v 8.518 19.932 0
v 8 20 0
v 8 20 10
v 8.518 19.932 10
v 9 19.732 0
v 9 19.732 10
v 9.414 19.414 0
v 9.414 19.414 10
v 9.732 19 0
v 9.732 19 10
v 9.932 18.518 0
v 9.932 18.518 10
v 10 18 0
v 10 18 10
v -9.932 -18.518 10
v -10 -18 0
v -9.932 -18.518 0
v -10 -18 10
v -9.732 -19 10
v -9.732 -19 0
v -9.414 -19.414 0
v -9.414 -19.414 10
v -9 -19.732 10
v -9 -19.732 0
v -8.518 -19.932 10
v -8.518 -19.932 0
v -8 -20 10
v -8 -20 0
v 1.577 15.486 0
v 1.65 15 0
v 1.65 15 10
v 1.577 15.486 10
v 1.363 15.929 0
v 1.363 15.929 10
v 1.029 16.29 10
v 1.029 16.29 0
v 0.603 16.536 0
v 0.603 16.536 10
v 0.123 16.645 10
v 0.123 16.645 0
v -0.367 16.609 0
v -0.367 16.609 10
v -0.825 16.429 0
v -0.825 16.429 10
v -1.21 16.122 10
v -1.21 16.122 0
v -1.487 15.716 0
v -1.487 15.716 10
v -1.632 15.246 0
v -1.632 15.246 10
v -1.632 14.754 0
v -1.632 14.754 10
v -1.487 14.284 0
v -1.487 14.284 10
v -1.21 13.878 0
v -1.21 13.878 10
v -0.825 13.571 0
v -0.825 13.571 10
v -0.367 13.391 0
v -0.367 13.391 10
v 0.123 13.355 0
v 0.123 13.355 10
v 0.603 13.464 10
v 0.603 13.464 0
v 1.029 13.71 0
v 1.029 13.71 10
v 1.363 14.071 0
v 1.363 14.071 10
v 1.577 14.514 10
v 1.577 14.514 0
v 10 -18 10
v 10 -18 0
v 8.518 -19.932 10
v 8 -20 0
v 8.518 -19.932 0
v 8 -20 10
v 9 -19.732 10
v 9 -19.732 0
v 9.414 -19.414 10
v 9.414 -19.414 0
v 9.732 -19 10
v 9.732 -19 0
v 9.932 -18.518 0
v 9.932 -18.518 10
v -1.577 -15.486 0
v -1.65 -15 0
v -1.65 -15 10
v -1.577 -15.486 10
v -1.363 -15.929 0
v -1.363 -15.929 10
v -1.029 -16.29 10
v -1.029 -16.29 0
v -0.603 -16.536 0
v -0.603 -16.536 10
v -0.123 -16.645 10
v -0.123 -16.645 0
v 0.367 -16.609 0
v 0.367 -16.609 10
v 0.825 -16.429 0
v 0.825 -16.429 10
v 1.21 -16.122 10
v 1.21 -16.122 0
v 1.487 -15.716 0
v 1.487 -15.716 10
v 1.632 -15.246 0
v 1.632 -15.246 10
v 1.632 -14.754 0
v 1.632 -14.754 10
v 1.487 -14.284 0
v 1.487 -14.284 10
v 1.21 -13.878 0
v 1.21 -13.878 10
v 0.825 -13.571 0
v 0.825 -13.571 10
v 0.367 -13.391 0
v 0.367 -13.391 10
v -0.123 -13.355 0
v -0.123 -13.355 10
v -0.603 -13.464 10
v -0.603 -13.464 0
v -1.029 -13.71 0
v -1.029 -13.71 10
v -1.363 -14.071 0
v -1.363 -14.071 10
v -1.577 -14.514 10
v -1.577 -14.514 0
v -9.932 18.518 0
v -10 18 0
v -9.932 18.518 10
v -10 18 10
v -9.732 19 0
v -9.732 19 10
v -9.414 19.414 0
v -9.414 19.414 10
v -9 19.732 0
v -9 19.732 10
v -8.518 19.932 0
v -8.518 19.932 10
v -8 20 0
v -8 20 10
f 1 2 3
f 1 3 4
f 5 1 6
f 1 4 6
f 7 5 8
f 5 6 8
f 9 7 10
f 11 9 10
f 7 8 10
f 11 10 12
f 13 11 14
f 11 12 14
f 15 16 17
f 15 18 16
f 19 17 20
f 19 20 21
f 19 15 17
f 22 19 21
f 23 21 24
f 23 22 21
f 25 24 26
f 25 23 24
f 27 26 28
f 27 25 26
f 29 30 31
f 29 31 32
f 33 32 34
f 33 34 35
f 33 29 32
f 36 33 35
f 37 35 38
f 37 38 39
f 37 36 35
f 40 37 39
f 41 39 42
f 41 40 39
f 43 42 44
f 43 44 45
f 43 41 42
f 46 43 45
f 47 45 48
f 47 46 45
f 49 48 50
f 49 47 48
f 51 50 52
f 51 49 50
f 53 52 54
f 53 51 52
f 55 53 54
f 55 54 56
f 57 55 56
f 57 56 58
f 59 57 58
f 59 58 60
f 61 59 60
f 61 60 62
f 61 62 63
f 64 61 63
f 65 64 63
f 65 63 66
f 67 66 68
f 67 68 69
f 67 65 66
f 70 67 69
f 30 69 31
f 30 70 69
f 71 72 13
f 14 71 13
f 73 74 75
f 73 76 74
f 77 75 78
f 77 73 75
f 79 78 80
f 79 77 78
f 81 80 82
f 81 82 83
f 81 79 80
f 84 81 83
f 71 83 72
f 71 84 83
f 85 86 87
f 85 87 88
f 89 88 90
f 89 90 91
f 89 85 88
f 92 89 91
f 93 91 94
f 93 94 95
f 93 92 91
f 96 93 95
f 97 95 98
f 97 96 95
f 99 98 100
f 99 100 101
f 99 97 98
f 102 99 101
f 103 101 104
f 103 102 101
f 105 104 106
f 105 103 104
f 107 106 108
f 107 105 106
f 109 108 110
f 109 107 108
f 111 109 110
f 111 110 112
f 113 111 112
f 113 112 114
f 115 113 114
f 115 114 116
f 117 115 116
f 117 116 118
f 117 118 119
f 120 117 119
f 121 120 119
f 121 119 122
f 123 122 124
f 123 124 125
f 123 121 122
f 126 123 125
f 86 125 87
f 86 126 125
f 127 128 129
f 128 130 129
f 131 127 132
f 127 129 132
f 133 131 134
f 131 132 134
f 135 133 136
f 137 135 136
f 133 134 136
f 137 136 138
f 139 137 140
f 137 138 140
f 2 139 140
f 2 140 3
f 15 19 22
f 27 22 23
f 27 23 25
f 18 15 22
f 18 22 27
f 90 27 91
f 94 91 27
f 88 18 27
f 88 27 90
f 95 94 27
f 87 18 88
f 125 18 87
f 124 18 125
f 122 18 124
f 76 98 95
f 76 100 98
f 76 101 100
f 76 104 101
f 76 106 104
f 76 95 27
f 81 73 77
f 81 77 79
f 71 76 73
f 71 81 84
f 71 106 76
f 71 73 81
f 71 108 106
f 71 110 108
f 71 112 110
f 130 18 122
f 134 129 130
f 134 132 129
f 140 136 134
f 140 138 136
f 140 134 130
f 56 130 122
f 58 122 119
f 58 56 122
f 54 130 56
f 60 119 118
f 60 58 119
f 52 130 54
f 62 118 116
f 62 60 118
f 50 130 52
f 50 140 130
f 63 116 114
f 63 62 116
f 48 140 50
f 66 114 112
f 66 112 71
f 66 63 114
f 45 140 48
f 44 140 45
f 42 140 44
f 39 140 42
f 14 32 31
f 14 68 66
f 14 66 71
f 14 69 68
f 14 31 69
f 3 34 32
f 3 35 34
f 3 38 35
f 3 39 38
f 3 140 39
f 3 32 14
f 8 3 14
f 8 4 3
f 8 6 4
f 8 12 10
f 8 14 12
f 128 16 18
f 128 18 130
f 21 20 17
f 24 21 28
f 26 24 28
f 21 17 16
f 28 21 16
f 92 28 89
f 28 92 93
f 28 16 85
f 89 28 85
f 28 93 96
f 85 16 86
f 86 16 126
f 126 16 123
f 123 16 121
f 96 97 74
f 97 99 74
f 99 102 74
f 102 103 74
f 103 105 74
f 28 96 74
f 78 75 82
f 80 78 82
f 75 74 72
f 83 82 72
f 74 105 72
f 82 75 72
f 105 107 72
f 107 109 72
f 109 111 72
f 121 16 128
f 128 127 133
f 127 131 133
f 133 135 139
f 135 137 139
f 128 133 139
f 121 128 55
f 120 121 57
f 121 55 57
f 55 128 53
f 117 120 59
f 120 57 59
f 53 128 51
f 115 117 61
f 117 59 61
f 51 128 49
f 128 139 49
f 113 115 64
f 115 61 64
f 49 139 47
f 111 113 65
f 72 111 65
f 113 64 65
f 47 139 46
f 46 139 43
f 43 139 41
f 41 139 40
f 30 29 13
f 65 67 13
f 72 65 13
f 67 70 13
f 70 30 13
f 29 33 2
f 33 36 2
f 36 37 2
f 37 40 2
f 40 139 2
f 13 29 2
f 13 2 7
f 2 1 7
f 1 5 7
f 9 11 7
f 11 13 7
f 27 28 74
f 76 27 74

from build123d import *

# Parameters (mm, degrees)
SKETCH_1_W      = 20
SKETCH_1_H      = 40
SKETCH_1_R      = 1.65
EXTRUDE_1_DEPTH = 10
FILLET_1_R      = 2


with BuildPart() as part:
    # 草图1 → 凸台-拉伸1 (new body)
    with BuildSketch(Plane.XY):
        Rectangle(SKETCH_1_W, SKETCH_1_H)
        with Locations((0, 15)):
            Circle(SKETCH_1_R, mode=Mode.SUBTRACT)
        with Locations(Location((0, -15, 0), (0, 0, 180))):
            Circle(SKETCH_1_R, mode=Mode.SUBTRACT)
    extrude(amount=EXTRUDE_1_DEPTH)

    # 圆角1
    fillet_1_edges = [part.edges().sort_by_distance(p)[0] for p in [
        (10, -20, 5),
        (-10, -20, 5),
        (-10, 20, 5),
        (10, 20, 5),
    ]]
    fillet(fillet_1_edges, radius=FILLET_1_R)


solid = part.part
